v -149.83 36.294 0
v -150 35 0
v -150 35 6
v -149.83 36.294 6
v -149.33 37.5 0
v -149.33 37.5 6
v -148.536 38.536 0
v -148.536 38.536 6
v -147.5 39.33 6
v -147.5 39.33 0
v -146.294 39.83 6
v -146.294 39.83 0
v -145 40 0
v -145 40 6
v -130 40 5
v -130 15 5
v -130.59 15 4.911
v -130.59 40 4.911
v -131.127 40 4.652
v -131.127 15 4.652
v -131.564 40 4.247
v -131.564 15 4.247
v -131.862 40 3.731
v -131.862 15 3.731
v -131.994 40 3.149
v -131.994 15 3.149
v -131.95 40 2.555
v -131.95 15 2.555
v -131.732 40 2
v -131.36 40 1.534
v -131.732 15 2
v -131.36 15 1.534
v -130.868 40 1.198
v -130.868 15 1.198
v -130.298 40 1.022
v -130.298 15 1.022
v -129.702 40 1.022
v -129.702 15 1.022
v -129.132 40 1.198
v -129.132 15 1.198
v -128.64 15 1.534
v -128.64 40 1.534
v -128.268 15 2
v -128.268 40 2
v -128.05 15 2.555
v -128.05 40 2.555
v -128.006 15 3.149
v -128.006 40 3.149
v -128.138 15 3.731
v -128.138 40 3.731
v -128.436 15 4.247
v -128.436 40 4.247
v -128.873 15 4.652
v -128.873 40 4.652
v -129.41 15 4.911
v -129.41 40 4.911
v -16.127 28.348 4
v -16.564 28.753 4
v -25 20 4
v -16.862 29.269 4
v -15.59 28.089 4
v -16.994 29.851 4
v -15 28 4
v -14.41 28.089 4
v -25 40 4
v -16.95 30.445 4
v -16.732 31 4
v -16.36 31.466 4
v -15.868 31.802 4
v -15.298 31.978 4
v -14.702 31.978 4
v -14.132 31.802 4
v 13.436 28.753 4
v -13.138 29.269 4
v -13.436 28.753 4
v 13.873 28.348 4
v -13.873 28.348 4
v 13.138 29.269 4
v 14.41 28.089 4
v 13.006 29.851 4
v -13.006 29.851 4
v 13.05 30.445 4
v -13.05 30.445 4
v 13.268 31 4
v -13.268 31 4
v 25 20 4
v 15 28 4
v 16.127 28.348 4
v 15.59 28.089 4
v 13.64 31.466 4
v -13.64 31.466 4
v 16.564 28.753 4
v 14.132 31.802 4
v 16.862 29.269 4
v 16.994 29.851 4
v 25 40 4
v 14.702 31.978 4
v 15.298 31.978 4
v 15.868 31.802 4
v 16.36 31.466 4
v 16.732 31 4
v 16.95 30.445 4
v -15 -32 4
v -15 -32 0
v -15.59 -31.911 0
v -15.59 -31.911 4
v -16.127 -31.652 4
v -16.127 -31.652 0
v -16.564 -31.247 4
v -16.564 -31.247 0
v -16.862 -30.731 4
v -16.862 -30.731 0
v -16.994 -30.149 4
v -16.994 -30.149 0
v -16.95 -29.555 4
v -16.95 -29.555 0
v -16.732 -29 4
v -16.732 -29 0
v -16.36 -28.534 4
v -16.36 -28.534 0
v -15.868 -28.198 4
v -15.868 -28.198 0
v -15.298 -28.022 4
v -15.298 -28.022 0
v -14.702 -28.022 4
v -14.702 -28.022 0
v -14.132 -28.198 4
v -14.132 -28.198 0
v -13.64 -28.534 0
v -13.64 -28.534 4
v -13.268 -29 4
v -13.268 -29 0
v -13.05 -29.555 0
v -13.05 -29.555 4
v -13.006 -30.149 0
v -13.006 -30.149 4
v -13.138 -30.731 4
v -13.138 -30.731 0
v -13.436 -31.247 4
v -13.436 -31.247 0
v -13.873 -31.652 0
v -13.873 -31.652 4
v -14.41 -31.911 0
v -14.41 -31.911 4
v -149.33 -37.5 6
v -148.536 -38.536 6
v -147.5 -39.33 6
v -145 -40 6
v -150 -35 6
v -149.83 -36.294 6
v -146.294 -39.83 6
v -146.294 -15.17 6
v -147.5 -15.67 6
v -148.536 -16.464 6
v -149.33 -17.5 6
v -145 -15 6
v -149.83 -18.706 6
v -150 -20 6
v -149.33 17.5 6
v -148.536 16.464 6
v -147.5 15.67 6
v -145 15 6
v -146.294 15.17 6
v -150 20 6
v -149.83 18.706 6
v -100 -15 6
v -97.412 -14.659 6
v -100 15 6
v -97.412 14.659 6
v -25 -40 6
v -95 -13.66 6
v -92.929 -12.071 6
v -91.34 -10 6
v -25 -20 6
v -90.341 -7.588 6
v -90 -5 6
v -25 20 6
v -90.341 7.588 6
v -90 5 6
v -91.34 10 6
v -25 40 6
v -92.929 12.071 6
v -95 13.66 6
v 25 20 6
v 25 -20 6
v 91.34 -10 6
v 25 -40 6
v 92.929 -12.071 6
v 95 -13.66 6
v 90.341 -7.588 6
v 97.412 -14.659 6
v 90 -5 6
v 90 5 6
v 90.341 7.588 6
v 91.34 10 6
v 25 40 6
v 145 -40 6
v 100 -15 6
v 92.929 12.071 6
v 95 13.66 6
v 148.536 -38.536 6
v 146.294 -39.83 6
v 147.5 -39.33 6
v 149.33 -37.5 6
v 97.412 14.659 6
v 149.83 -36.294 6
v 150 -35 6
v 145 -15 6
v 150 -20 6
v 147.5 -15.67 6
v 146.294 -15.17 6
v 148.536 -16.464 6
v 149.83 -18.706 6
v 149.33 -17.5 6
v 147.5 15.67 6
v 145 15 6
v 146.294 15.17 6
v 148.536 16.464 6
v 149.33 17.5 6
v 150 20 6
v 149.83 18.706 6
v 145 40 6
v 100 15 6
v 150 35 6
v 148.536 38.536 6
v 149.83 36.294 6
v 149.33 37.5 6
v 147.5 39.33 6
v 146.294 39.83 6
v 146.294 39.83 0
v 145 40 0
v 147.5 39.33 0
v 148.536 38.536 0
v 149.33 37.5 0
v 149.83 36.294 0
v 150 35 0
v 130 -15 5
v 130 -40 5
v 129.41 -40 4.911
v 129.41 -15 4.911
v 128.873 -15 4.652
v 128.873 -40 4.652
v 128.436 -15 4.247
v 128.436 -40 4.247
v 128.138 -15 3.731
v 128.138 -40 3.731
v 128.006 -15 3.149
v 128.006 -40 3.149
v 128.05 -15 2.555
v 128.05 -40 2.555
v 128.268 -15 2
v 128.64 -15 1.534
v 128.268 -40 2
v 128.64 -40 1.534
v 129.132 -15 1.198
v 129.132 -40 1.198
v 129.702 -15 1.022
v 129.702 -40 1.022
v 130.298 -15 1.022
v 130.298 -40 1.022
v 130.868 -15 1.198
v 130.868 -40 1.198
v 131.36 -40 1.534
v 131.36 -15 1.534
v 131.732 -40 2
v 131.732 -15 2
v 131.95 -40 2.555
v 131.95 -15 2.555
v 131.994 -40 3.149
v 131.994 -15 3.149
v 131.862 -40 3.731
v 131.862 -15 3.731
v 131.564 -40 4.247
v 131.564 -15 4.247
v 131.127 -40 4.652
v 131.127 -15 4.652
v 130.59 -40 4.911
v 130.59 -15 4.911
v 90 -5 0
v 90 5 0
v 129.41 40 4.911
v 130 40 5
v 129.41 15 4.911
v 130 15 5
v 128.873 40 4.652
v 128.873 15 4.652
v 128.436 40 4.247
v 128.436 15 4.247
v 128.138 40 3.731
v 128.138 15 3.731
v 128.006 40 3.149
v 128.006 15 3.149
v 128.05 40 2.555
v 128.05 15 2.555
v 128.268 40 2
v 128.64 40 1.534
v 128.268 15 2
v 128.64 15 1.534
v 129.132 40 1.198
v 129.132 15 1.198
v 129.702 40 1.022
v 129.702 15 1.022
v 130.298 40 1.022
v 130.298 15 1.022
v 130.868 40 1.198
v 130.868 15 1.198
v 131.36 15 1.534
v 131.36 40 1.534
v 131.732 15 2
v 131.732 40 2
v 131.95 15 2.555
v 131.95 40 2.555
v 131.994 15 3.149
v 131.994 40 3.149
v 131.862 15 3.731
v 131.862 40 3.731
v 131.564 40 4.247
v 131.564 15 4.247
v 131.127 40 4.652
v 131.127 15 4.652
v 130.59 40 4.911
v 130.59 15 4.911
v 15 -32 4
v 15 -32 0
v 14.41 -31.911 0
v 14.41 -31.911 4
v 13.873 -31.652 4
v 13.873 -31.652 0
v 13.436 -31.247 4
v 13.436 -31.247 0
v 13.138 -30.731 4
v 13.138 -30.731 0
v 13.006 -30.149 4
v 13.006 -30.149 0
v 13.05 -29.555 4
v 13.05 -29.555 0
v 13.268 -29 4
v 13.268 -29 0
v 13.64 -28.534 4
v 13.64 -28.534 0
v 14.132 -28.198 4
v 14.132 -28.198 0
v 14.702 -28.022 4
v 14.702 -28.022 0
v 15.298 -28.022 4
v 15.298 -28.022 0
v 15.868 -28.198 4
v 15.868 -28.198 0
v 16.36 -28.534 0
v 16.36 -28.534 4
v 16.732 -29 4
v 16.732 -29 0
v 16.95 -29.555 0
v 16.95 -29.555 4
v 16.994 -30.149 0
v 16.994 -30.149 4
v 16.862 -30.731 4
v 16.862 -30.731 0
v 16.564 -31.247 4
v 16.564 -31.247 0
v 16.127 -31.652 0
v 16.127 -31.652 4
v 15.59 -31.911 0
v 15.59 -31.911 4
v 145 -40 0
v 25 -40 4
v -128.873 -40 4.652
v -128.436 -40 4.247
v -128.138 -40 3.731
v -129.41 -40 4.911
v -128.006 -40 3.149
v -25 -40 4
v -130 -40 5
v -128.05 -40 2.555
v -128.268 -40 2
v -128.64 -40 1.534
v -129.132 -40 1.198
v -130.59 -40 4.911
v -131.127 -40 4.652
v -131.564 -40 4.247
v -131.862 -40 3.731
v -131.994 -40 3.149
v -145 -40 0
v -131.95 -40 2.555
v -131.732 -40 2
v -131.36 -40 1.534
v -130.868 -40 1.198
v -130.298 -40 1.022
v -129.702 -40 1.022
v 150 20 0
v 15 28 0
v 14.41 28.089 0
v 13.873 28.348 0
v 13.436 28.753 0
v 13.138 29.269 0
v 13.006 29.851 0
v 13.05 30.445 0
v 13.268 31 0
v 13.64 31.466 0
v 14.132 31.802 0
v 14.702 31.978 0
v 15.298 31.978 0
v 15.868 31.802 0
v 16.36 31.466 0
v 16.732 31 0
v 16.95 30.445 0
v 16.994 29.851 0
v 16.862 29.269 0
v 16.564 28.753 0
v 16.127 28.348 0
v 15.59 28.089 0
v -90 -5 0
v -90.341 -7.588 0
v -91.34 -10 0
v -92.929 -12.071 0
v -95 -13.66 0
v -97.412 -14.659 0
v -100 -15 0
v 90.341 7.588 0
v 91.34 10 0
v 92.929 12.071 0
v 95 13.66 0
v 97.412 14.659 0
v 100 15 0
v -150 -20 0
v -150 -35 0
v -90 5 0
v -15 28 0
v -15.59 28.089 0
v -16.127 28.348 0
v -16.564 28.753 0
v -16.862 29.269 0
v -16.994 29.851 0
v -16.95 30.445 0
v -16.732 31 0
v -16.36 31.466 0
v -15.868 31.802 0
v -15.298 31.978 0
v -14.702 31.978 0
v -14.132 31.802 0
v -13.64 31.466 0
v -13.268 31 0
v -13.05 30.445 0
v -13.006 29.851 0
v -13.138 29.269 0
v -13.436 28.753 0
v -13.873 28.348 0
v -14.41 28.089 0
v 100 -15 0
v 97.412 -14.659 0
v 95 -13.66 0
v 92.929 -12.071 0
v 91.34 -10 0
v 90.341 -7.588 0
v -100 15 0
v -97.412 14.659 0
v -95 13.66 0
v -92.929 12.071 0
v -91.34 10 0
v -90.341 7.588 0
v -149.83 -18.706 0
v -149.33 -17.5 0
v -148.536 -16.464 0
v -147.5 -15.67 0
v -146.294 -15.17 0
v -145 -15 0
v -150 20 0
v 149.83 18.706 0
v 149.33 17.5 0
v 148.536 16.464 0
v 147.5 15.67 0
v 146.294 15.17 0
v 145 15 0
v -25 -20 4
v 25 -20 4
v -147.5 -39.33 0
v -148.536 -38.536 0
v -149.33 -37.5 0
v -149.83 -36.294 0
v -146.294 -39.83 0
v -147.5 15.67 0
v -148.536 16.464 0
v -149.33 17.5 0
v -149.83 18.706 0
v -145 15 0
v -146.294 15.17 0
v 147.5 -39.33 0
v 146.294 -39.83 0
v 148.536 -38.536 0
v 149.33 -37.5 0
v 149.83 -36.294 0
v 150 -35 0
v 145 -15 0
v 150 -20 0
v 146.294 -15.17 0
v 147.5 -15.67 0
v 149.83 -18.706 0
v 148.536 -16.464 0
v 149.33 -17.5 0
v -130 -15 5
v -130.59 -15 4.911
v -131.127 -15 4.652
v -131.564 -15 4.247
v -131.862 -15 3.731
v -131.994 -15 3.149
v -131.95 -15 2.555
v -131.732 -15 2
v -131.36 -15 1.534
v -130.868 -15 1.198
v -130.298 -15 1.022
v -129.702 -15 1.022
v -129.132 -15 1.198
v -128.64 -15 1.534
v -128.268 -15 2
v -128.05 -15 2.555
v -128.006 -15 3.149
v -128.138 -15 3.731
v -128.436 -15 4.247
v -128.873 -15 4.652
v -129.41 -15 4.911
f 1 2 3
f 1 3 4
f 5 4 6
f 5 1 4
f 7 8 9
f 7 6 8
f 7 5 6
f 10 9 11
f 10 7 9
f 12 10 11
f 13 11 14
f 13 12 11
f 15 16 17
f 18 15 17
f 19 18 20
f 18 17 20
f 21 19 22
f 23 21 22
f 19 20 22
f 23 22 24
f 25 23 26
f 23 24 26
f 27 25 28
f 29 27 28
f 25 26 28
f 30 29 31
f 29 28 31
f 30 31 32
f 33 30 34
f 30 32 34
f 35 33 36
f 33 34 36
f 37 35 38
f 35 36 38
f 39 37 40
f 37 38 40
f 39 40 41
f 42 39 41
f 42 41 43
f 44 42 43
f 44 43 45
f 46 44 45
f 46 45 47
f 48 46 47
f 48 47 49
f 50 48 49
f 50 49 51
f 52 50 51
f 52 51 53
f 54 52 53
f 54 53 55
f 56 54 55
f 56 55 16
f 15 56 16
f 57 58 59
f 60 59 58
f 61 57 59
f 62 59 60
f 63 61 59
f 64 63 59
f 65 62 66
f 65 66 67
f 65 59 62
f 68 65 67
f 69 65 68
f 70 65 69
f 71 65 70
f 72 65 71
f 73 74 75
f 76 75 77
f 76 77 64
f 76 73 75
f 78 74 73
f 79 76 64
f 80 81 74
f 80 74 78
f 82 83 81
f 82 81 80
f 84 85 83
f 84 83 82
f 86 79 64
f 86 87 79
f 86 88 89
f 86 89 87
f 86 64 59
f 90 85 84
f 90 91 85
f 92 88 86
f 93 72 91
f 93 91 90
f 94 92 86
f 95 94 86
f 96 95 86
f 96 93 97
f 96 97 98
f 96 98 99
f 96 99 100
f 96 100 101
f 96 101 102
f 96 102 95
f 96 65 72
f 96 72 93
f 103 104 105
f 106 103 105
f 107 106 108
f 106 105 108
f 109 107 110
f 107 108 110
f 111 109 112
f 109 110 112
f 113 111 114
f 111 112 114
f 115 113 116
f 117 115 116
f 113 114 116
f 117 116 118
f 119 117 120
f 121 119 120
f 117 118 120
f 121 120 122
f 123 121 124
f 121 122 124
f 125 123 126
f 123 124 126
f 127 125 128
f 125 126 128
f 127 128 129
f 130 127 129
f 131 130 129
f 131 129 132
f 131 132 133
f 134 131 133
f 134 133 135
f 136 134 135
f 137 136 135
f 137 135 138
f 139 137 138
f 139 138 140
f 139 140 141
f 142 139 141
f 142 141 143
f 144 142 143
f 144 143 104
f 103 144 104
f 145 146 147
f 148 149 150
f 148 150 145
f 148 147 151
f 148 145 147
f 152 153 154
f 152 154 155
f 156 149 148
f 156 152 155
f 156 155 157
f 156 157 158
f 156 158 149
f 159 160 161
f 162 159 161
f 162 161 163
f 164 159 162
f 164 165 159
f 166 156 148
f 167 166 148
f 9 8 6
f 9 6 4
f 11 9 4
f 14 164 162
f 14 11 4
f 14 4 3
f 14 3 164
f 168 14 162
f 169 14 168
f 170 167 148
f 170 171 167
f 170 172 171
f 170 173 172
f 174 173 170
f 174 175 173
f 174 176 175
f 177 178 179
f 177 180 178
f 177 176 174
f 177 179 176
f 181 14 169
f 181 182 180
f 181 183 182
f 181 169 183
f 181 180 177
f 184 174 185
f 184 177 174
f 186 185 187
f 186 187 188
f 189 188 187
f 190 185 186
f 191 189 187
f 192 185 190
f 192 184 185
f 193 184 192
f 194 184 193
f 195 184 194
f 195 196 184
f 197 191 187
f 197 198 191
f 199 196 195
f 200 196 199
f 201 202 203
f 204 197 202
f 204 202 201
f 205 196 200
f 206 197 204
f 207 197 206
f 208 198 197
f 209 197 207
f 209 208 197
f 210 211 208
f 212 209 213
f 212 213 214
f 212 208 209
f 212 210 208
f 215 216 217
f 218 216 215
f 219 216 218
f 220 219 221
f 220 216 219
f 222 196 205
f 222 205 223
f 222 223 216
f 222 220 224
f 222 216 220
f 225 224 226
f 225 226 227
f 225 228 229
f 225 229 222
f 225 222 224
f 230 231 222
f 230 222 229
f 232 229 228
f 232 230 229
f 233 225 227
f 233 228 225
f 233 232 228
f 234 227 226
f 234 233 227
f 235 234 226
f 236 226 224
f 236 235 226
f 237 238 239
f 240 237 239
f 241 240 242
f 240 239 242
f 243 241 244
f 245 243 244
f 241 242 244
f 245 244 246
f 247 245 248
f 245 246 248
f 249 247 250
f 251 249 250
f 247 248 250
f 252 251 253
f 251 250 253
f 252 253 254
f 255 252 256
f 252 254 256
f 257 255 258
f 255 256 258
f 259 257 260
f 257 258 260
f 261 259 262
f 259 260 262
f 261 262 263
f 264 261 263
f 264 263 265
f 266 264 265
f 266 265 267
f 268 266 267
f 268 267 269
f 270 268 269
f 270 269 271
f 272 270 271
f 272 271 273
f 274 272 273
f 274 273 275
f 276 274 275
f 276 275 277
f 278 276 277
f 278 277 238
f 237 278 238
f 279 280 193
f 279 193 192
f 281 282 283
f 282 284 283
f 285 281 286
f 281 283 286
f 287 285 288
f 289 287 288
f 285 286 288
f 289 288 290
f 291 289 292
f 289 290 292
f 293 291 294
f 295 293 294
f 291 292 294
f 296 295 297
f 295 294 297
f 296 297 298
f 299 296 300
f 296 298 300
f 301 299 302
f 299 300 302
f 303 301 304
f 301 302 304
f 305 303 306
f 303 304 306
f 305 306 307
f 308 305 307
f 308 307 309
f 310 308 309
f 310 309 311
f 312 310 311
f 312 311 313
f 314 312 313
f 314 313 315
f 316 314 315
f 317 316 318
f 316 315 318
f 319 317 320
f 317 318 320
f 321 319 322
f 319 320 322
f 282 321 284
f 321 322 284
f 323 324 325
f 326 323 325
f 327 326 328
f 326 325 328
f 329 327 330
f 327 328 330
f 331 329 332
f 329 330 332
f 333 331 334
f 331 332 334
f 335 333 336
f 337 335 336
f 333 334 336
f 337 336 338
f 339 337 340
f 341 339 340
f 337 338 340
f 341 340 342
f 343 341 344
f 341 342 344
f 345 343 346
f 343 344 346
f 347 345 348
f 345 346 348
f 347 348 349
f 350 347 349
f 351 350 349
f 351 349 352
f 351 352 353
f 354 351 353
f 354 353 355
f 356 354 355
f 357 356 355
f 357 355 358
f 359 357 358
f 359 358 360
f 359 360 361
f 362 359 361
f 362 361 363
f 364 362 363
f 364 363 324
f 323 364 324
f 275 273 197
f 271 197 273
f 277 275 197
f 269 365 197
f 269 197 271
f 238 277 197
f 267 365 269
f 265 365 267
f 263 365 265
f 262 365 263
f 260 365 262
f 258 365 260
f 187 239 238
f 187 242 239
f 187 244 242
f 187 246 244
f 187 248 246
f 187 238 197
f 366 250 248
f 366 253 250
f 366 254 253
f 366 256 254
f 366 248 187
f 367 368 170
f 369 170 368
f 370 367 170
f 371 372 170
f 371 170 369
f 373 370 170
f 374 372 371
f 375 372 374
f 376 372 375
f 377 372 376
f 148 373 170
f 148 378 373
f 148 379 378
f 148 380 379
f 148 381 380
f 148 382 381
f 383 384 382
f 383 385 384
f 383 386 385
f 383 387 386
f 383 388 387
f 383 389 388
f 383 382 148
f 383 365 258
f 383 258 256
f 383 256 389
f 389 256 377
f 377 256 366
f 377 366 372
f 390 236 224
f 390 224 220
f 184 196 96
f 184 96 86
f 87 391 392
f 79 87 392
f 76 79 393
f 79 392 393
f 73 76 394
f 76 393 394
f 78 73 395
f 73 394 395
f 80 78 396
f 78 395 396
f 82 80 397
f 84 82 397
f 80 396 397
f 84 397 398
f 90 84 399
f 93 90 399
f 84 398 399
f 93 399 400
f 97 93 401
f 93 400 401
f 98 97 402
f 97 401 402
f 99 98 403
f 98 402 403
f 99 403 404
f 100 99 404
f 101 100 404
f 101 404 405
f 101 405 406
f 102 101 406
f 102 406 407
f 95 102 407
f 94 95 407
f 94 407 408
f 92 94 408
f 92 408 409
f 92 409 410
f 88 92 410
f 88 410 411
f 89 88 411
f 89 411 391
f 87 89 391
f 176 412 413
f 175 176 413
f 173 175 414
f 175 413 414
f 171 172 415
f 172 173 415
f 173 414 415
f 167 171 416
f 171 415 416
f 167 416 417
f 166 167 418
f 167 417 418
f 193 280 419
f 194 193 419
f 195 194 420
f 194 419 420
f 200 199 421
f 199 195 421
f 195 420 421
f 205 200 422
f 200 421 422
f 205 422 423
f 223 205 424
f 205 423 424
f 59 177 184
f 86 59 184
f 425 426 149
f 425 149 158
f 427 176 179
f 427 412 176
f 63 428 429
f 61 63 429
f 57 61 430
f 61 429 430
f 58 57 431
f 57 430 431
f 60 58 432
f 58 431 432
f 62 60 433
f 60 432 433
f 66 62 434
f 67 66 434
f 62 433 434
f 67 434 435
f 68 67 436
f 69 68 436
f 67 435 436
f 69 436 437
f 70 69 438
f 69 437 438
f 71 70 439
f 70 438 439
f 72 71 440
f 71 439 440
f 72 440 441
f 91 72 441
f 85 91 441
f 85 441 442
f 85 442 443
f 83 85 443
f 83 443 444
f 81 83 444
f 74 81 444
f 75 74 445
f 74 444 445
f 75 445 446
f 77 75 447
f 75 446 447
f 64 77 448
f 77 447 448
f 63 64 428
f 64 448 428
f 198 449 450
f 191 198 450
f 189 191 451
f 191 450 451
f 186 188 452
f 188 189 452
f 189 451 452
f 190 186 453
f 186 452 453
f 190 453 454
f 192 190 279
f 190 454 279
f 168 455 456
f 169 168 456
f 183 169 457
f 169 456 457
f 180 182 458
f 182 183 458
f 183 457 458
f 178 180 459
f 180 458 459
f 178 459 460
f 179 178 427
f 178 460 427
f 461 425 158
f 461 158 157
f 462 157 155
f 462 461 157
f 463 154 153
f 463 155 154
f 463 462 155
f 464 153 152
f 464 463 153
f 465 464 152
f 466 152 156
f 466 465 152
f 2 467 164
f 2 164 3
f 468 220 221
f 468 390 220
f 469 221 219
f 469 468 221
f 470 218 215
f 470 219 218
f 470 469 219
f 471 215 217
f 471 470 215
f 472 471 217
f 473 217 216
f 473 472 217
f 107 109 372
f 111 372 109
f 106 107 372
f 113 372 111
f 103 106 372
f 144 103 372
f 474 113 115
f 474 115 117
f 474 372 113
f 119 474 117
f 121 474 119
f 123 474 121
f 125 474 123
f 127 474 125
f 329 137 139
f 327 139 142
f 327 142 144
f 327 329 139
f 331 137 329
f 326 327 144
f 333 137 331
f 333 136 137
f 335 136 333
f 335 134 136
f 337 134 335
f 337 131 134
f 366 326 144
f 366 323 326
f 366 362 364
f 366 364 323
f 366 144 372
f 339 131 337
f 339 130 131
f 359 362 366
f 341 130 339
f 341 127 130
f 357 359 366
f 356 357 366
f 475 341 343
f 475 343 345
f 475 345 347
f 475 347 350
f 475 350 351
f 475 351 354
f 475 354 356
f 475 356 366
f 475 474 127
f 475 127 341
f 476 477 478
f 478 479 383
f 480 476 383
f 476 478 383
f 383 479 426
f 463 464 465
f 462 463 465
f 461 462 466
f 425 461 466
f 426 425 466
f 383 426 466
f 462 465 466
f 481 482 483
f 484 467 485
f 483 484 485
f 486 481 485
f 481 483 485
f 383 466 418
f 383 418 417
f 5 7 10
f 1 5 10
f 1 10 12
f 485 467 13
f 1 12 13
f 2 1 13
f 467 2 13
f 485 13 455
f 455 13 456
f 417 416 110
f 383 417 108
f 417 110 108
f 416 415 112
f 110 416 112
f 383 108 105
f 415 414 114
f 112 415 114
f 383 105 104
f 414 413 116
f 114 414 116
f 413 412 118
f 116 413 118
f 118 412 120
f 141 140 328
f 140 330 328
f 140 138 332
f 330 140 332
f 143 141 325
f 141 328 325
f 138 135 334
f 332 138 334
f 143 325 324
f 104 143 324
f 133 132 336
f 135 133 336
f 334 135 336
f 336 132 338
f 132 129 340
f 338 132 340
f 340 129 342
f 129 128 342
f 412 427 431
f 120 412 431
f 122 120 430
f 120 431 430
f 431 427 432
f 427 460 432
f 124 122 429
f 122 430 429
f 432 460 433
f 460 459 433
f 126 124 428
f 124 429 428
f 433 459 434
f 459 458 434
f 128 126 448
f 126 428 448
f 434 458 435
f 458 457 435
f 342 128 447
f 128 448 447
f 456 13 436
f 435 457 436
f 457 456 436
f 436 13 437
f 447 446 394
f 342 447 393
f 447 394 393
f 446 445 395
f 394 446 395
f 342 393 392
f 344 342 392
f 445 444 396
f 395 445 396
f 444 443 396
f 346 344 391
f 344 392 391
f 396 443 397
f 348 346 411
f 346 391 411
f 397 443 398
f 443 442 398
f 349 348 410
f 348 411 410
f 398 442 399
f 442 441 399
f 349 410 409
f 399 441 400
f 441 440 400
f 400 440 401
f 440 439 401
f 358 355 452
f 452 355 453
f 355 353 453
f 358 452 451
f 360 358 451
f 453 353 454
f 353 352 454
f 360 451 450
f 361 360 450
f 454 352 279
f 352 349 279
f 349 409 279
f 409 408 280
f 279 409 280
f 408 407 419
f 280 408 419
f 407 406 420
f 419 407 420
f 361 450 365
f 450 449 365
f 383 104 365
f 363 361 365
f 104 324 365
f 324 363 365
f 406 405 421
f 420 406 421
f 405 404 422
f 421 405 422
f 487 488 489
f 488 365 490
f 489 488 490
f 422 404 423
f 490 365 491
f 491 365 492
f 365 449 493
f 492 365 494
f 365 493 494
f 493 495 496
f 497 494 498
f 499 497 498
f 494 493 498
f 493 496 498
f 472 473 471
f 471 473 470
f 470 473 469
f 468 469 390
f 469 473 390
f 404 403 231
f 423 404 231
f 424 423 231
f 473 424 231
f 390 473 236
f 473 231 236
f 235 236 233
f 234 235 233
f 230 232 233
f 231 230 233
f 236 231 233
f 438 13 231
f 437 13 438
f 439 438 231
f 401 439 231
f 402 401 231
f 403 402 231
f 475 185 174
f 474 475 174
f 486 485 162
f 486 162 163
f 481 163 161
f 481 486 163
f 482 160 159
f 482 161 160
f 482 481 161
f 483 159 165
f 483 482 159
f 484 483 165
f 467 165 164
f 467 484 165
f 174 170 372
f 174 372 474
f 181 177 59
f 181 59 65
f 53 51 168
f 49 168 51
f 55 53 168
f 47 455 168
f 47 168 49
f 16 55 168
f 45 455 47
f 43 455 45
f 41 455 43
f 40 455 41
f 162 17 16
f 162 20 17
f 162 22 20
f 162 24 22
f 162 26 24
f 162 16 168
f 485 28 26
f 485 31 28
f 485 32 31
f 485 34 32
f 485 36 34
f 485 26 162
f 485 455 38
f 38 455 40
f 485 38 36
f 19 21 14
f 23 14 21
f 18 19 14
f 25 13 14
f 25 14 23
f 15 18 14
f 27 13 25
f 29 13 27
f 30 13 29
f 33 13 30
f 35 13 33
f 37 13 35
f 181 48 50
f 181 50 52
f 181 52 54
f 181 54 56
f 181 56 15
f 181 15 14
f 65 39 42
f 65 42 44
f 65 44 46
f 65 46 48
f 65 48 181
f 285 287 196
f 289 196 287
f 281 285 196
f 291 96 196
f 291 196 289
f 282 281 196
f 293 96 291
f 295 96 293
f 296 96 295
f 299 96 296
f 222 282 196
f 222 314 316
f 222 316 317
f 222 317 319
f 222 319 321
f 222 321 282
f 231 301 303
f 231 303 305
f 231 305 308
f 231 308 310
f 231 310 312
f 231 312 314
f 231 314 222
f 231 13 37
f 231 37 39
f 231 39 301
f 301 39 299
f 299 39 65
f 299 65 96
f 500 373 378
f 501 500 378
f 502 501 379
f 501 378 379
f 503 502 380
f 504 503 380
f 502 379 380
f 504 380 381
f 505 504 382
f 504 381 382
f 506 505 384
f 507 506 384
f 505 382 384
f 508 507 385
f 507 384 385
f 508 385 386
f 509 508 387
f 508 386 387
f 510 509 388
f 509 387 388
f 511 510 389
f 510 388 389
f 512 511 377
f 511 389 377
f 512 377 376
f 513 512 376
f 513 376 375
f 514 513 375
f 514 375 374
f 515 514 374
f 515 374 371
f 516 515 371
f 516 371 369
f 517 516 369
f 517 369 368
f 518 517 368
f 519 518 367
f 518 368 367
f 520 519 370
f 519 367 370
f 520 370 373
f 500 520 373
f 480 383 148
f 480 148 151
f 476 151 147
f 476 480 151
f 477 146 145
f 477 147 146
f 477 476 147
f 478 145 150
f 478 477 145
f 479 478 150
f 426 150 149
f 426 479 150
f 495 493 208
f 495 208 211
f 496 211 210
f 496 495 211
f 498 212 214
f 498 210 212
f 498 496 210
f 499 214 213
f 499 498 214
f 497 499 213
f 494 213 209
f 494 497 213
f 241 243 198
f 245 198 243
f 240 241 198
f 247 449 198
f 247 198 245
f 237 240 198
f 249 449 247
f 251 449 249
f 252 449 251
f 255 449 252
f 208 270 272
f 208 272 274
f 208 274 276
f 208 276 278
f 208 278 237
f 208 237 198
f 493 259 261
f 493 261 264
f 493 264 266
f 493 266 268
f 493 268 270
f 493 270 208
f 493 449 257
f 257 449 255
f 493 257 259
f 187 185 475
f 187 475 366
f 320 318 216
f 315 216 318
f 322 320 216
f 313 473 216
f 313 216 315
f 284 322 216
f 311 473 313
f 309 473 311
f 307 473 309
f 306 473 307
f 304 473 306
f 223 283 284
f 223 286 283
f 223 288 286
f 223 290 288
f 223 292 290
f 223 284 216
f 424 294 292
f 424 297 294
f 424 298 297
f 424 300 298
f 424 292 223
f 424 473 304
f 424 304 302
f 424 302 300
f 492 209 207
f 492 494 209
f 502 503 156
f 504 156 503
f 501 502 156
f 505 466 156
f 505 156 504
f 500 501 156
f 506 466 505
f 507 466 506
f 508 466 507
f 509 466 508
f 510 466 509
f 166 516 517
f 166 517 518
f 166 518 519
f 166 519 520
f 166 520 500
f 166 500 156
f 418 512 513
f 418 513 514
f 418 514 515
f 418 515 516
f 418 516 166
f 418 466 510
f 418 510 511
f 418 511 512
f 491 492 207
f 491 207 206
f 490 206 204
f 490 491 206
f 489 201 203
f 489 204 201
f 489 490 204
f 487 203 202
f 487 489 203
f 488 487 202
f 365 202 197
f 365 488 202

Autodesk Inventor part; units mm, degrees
ref_plane "YZ Plane" through (0, 0, 0) normal (1, 0, 0) x (0, 1, 0)
ref_plane "XZ Plane" through (0, 0, 0) normal (0, 1, 0) x (-1, 0, 0)
ref_plane "XY Plane" through (0, 0, 0) normal (0, 0, 1) x (1, 0, 0)
sketch "Esboço1" plane through (0, 0, 0) normal (0, 0, 1) x (1, 0, 0)
  line L0 (145, -40) -> (-145, -40)
  line L1 (-145, 40) -> (145, 40)
  line L2 (150, -40) -> (-150, 40) construction
  line L3 (-150, -40) -> (150, 40) construction
  line L4 (-145, -15) -> (-100, -15)
  line L5 (-90, -5) -> (-90, 5)
  line L6 (-100, 15) -> (-145, 15)
  line L7 (145, 15) -> (100, 15)
  line L8 (90, 5) -> (90, -5)
  line L9 (100, -15) -> (145, -15)
  line L10 (150, 35) -> (150, 20)
  line L11 (150, -20) -> (150, -35)
  line L12 (-150, -35) -> (-150, -20)
  line L13 (-150, 20) -> (-150, 35)
  arc A0 (100, 15) -> (90, 5) centre (100, 5) ccw
  arc A1 (90, -5) -> (100, -15) centre (100, -5) ccw
  arc A2 (-100, -15) -> (-90, -5) centre (-100, -5) ccw
  arc A3 (-90, 5) -> (-100, 15) centre (-100, 5) ccw
  arc A4 (150, 35) -> (145, 40) centre (145, 35) ccw
  arc A5 (145, 15) -> (150, 20) centre (145, 20) ccw
  arc A6 (150, -20) -> (145, -15) centre (145, -20) ccw
  arc A7 (145, -40) -> (150, -35) centre (145, -35) ccw
  arc A8 (-145, -15) -> (-150, -20) centre (-145, -20) ccw
  arc A9 (-150, -35) -> (-145, -40) centre (-145, -35) ccw
  arc A10 (-145, 40) -> (-150, 35) centre (-145, 35) ccw
  arc A11 (-150, 20) -> (-145, 15) centre (-145, 20) ccw
  point P0 (0, 0)
  point P1 (-150, -15)
  point P2 (-150, 15)
  point P3 (150, 15)
  dimension "d5" = 300
  dimension "d6" = 80
  dimension "d11" = 10
  dimension "d12" = 5
  dimension "d46" = 30
  dimension "d47" = 30
  dimension "d49" = 150
  dimension "d50" = 150
  dimension "d51" = 60
  dimension "d52" = 60
  dimension "d54" = 15
extrude "Extrusão1" add sketch "Esboço1" along normal blind 6
sketch "Esboço2" plane through (0, 0, 6) normal (0, 0, 1) x (1, 0, 0)
  line L0 (145, 40) -> (-145, 40) projected
  line L1 (25, -40) -> (-25, -40)
  line L2 (-25, 40) -> (25, 40)
  line L3 (25, -40) -> (-25, 40) construction
  line L4 (-25, -40) -> (25, 40) construction
  line L5 (-25, 20) -> (25, 20)
  line L6 (25, -20) -> (-25, -20)
  line L7 (-25, -40) -> (-25, -20)
  line L8 (-25, 20) -> (-25, 40)
  line L9 (25, 40) -> (25, 20)
  line L10 (25, -20) -> (25, -40)
  line L11 (-145, -40) -> (145, -40) projected
  point P0 (0, 0)
  dimension "d15" = 50
  dimension "d16" = 20
  dimension "d17" = 20
  dimension "d18" = 40
  dimension "d19" = 25
  dimension "d20" = 80
extrude "Extrusão2" cut sketch "Esboço2" against normal blind 2
sketch "Esboço3" plane through (0, 0, 4) normal (0, 0, 1) x (1, 0, 0)
  line L0 (25, 20) -> (-25, 20) projected
  line L1 (145, 40) -> (25, 40) projected
  line L2 (32.6697, 0) -> (-36.0886, 0) construction
  point P0 (0, 0)
  point P1 (15, 30)
  point P2 (-15, 30)
  point P3 (15, -30)
  point P4 (-15, -30)
  dimension "d23" = 10
  dimension "d24" = 20
  dimension "d25" = 15
  dimension "d26" = 30
  dimension "d27" = 10
hole "Furo1" at (15, 30, 4) at (-15, 30, 4) at (15, -30, 4) at (-15, -30, 4) direction (0, 0, -1) diameter 4 end through all
sketch "Esboço4" plane through (-145, 40, 0) normal (0, 1, 0) x (1, 0, 0)
  line L0 (290, -6) -> (170, -6) projected
  line L1 (290, 0) -> (0, 0) projected
  line L2 (295, 0) -> (295, -6) projected
  line L3 (145, -28.4495) -> (145, 21.5505) construction
  point P0 (145, 0)
  point P1 (275, -3)
  point P2 (145, 0)
  point P3 (15, -3)
  dimension "d35" = 3
  dimension "d36" = 6
  dimension "d37" = 20
  dimension "d38" = 50
hole "Furo2" at (130, 40, 3) at (-130, 40, 3) direction (0, -1, 0) diameter 4 end through all
equation "\"d47\" = d46"
equation "\"d49\" = 0.5 * d5"
equation "\"d50\" = d49"
equation "\"d52\" = d51"
equation "\"d54\" = 0.5 * d46"
equation "\"d18\" = -d17 + d20 - d16"
equation "\"d19\" = 0.5 * d15"
equation "\"d23\" = 0.5 * d24"
equation "\"d26\" = 2 * d25"
equation "\"d27\" = d23"
equation "\"d35\" = 0.5 * d36"
properties part number "Chassis" material "Plástico PC/ABS"
